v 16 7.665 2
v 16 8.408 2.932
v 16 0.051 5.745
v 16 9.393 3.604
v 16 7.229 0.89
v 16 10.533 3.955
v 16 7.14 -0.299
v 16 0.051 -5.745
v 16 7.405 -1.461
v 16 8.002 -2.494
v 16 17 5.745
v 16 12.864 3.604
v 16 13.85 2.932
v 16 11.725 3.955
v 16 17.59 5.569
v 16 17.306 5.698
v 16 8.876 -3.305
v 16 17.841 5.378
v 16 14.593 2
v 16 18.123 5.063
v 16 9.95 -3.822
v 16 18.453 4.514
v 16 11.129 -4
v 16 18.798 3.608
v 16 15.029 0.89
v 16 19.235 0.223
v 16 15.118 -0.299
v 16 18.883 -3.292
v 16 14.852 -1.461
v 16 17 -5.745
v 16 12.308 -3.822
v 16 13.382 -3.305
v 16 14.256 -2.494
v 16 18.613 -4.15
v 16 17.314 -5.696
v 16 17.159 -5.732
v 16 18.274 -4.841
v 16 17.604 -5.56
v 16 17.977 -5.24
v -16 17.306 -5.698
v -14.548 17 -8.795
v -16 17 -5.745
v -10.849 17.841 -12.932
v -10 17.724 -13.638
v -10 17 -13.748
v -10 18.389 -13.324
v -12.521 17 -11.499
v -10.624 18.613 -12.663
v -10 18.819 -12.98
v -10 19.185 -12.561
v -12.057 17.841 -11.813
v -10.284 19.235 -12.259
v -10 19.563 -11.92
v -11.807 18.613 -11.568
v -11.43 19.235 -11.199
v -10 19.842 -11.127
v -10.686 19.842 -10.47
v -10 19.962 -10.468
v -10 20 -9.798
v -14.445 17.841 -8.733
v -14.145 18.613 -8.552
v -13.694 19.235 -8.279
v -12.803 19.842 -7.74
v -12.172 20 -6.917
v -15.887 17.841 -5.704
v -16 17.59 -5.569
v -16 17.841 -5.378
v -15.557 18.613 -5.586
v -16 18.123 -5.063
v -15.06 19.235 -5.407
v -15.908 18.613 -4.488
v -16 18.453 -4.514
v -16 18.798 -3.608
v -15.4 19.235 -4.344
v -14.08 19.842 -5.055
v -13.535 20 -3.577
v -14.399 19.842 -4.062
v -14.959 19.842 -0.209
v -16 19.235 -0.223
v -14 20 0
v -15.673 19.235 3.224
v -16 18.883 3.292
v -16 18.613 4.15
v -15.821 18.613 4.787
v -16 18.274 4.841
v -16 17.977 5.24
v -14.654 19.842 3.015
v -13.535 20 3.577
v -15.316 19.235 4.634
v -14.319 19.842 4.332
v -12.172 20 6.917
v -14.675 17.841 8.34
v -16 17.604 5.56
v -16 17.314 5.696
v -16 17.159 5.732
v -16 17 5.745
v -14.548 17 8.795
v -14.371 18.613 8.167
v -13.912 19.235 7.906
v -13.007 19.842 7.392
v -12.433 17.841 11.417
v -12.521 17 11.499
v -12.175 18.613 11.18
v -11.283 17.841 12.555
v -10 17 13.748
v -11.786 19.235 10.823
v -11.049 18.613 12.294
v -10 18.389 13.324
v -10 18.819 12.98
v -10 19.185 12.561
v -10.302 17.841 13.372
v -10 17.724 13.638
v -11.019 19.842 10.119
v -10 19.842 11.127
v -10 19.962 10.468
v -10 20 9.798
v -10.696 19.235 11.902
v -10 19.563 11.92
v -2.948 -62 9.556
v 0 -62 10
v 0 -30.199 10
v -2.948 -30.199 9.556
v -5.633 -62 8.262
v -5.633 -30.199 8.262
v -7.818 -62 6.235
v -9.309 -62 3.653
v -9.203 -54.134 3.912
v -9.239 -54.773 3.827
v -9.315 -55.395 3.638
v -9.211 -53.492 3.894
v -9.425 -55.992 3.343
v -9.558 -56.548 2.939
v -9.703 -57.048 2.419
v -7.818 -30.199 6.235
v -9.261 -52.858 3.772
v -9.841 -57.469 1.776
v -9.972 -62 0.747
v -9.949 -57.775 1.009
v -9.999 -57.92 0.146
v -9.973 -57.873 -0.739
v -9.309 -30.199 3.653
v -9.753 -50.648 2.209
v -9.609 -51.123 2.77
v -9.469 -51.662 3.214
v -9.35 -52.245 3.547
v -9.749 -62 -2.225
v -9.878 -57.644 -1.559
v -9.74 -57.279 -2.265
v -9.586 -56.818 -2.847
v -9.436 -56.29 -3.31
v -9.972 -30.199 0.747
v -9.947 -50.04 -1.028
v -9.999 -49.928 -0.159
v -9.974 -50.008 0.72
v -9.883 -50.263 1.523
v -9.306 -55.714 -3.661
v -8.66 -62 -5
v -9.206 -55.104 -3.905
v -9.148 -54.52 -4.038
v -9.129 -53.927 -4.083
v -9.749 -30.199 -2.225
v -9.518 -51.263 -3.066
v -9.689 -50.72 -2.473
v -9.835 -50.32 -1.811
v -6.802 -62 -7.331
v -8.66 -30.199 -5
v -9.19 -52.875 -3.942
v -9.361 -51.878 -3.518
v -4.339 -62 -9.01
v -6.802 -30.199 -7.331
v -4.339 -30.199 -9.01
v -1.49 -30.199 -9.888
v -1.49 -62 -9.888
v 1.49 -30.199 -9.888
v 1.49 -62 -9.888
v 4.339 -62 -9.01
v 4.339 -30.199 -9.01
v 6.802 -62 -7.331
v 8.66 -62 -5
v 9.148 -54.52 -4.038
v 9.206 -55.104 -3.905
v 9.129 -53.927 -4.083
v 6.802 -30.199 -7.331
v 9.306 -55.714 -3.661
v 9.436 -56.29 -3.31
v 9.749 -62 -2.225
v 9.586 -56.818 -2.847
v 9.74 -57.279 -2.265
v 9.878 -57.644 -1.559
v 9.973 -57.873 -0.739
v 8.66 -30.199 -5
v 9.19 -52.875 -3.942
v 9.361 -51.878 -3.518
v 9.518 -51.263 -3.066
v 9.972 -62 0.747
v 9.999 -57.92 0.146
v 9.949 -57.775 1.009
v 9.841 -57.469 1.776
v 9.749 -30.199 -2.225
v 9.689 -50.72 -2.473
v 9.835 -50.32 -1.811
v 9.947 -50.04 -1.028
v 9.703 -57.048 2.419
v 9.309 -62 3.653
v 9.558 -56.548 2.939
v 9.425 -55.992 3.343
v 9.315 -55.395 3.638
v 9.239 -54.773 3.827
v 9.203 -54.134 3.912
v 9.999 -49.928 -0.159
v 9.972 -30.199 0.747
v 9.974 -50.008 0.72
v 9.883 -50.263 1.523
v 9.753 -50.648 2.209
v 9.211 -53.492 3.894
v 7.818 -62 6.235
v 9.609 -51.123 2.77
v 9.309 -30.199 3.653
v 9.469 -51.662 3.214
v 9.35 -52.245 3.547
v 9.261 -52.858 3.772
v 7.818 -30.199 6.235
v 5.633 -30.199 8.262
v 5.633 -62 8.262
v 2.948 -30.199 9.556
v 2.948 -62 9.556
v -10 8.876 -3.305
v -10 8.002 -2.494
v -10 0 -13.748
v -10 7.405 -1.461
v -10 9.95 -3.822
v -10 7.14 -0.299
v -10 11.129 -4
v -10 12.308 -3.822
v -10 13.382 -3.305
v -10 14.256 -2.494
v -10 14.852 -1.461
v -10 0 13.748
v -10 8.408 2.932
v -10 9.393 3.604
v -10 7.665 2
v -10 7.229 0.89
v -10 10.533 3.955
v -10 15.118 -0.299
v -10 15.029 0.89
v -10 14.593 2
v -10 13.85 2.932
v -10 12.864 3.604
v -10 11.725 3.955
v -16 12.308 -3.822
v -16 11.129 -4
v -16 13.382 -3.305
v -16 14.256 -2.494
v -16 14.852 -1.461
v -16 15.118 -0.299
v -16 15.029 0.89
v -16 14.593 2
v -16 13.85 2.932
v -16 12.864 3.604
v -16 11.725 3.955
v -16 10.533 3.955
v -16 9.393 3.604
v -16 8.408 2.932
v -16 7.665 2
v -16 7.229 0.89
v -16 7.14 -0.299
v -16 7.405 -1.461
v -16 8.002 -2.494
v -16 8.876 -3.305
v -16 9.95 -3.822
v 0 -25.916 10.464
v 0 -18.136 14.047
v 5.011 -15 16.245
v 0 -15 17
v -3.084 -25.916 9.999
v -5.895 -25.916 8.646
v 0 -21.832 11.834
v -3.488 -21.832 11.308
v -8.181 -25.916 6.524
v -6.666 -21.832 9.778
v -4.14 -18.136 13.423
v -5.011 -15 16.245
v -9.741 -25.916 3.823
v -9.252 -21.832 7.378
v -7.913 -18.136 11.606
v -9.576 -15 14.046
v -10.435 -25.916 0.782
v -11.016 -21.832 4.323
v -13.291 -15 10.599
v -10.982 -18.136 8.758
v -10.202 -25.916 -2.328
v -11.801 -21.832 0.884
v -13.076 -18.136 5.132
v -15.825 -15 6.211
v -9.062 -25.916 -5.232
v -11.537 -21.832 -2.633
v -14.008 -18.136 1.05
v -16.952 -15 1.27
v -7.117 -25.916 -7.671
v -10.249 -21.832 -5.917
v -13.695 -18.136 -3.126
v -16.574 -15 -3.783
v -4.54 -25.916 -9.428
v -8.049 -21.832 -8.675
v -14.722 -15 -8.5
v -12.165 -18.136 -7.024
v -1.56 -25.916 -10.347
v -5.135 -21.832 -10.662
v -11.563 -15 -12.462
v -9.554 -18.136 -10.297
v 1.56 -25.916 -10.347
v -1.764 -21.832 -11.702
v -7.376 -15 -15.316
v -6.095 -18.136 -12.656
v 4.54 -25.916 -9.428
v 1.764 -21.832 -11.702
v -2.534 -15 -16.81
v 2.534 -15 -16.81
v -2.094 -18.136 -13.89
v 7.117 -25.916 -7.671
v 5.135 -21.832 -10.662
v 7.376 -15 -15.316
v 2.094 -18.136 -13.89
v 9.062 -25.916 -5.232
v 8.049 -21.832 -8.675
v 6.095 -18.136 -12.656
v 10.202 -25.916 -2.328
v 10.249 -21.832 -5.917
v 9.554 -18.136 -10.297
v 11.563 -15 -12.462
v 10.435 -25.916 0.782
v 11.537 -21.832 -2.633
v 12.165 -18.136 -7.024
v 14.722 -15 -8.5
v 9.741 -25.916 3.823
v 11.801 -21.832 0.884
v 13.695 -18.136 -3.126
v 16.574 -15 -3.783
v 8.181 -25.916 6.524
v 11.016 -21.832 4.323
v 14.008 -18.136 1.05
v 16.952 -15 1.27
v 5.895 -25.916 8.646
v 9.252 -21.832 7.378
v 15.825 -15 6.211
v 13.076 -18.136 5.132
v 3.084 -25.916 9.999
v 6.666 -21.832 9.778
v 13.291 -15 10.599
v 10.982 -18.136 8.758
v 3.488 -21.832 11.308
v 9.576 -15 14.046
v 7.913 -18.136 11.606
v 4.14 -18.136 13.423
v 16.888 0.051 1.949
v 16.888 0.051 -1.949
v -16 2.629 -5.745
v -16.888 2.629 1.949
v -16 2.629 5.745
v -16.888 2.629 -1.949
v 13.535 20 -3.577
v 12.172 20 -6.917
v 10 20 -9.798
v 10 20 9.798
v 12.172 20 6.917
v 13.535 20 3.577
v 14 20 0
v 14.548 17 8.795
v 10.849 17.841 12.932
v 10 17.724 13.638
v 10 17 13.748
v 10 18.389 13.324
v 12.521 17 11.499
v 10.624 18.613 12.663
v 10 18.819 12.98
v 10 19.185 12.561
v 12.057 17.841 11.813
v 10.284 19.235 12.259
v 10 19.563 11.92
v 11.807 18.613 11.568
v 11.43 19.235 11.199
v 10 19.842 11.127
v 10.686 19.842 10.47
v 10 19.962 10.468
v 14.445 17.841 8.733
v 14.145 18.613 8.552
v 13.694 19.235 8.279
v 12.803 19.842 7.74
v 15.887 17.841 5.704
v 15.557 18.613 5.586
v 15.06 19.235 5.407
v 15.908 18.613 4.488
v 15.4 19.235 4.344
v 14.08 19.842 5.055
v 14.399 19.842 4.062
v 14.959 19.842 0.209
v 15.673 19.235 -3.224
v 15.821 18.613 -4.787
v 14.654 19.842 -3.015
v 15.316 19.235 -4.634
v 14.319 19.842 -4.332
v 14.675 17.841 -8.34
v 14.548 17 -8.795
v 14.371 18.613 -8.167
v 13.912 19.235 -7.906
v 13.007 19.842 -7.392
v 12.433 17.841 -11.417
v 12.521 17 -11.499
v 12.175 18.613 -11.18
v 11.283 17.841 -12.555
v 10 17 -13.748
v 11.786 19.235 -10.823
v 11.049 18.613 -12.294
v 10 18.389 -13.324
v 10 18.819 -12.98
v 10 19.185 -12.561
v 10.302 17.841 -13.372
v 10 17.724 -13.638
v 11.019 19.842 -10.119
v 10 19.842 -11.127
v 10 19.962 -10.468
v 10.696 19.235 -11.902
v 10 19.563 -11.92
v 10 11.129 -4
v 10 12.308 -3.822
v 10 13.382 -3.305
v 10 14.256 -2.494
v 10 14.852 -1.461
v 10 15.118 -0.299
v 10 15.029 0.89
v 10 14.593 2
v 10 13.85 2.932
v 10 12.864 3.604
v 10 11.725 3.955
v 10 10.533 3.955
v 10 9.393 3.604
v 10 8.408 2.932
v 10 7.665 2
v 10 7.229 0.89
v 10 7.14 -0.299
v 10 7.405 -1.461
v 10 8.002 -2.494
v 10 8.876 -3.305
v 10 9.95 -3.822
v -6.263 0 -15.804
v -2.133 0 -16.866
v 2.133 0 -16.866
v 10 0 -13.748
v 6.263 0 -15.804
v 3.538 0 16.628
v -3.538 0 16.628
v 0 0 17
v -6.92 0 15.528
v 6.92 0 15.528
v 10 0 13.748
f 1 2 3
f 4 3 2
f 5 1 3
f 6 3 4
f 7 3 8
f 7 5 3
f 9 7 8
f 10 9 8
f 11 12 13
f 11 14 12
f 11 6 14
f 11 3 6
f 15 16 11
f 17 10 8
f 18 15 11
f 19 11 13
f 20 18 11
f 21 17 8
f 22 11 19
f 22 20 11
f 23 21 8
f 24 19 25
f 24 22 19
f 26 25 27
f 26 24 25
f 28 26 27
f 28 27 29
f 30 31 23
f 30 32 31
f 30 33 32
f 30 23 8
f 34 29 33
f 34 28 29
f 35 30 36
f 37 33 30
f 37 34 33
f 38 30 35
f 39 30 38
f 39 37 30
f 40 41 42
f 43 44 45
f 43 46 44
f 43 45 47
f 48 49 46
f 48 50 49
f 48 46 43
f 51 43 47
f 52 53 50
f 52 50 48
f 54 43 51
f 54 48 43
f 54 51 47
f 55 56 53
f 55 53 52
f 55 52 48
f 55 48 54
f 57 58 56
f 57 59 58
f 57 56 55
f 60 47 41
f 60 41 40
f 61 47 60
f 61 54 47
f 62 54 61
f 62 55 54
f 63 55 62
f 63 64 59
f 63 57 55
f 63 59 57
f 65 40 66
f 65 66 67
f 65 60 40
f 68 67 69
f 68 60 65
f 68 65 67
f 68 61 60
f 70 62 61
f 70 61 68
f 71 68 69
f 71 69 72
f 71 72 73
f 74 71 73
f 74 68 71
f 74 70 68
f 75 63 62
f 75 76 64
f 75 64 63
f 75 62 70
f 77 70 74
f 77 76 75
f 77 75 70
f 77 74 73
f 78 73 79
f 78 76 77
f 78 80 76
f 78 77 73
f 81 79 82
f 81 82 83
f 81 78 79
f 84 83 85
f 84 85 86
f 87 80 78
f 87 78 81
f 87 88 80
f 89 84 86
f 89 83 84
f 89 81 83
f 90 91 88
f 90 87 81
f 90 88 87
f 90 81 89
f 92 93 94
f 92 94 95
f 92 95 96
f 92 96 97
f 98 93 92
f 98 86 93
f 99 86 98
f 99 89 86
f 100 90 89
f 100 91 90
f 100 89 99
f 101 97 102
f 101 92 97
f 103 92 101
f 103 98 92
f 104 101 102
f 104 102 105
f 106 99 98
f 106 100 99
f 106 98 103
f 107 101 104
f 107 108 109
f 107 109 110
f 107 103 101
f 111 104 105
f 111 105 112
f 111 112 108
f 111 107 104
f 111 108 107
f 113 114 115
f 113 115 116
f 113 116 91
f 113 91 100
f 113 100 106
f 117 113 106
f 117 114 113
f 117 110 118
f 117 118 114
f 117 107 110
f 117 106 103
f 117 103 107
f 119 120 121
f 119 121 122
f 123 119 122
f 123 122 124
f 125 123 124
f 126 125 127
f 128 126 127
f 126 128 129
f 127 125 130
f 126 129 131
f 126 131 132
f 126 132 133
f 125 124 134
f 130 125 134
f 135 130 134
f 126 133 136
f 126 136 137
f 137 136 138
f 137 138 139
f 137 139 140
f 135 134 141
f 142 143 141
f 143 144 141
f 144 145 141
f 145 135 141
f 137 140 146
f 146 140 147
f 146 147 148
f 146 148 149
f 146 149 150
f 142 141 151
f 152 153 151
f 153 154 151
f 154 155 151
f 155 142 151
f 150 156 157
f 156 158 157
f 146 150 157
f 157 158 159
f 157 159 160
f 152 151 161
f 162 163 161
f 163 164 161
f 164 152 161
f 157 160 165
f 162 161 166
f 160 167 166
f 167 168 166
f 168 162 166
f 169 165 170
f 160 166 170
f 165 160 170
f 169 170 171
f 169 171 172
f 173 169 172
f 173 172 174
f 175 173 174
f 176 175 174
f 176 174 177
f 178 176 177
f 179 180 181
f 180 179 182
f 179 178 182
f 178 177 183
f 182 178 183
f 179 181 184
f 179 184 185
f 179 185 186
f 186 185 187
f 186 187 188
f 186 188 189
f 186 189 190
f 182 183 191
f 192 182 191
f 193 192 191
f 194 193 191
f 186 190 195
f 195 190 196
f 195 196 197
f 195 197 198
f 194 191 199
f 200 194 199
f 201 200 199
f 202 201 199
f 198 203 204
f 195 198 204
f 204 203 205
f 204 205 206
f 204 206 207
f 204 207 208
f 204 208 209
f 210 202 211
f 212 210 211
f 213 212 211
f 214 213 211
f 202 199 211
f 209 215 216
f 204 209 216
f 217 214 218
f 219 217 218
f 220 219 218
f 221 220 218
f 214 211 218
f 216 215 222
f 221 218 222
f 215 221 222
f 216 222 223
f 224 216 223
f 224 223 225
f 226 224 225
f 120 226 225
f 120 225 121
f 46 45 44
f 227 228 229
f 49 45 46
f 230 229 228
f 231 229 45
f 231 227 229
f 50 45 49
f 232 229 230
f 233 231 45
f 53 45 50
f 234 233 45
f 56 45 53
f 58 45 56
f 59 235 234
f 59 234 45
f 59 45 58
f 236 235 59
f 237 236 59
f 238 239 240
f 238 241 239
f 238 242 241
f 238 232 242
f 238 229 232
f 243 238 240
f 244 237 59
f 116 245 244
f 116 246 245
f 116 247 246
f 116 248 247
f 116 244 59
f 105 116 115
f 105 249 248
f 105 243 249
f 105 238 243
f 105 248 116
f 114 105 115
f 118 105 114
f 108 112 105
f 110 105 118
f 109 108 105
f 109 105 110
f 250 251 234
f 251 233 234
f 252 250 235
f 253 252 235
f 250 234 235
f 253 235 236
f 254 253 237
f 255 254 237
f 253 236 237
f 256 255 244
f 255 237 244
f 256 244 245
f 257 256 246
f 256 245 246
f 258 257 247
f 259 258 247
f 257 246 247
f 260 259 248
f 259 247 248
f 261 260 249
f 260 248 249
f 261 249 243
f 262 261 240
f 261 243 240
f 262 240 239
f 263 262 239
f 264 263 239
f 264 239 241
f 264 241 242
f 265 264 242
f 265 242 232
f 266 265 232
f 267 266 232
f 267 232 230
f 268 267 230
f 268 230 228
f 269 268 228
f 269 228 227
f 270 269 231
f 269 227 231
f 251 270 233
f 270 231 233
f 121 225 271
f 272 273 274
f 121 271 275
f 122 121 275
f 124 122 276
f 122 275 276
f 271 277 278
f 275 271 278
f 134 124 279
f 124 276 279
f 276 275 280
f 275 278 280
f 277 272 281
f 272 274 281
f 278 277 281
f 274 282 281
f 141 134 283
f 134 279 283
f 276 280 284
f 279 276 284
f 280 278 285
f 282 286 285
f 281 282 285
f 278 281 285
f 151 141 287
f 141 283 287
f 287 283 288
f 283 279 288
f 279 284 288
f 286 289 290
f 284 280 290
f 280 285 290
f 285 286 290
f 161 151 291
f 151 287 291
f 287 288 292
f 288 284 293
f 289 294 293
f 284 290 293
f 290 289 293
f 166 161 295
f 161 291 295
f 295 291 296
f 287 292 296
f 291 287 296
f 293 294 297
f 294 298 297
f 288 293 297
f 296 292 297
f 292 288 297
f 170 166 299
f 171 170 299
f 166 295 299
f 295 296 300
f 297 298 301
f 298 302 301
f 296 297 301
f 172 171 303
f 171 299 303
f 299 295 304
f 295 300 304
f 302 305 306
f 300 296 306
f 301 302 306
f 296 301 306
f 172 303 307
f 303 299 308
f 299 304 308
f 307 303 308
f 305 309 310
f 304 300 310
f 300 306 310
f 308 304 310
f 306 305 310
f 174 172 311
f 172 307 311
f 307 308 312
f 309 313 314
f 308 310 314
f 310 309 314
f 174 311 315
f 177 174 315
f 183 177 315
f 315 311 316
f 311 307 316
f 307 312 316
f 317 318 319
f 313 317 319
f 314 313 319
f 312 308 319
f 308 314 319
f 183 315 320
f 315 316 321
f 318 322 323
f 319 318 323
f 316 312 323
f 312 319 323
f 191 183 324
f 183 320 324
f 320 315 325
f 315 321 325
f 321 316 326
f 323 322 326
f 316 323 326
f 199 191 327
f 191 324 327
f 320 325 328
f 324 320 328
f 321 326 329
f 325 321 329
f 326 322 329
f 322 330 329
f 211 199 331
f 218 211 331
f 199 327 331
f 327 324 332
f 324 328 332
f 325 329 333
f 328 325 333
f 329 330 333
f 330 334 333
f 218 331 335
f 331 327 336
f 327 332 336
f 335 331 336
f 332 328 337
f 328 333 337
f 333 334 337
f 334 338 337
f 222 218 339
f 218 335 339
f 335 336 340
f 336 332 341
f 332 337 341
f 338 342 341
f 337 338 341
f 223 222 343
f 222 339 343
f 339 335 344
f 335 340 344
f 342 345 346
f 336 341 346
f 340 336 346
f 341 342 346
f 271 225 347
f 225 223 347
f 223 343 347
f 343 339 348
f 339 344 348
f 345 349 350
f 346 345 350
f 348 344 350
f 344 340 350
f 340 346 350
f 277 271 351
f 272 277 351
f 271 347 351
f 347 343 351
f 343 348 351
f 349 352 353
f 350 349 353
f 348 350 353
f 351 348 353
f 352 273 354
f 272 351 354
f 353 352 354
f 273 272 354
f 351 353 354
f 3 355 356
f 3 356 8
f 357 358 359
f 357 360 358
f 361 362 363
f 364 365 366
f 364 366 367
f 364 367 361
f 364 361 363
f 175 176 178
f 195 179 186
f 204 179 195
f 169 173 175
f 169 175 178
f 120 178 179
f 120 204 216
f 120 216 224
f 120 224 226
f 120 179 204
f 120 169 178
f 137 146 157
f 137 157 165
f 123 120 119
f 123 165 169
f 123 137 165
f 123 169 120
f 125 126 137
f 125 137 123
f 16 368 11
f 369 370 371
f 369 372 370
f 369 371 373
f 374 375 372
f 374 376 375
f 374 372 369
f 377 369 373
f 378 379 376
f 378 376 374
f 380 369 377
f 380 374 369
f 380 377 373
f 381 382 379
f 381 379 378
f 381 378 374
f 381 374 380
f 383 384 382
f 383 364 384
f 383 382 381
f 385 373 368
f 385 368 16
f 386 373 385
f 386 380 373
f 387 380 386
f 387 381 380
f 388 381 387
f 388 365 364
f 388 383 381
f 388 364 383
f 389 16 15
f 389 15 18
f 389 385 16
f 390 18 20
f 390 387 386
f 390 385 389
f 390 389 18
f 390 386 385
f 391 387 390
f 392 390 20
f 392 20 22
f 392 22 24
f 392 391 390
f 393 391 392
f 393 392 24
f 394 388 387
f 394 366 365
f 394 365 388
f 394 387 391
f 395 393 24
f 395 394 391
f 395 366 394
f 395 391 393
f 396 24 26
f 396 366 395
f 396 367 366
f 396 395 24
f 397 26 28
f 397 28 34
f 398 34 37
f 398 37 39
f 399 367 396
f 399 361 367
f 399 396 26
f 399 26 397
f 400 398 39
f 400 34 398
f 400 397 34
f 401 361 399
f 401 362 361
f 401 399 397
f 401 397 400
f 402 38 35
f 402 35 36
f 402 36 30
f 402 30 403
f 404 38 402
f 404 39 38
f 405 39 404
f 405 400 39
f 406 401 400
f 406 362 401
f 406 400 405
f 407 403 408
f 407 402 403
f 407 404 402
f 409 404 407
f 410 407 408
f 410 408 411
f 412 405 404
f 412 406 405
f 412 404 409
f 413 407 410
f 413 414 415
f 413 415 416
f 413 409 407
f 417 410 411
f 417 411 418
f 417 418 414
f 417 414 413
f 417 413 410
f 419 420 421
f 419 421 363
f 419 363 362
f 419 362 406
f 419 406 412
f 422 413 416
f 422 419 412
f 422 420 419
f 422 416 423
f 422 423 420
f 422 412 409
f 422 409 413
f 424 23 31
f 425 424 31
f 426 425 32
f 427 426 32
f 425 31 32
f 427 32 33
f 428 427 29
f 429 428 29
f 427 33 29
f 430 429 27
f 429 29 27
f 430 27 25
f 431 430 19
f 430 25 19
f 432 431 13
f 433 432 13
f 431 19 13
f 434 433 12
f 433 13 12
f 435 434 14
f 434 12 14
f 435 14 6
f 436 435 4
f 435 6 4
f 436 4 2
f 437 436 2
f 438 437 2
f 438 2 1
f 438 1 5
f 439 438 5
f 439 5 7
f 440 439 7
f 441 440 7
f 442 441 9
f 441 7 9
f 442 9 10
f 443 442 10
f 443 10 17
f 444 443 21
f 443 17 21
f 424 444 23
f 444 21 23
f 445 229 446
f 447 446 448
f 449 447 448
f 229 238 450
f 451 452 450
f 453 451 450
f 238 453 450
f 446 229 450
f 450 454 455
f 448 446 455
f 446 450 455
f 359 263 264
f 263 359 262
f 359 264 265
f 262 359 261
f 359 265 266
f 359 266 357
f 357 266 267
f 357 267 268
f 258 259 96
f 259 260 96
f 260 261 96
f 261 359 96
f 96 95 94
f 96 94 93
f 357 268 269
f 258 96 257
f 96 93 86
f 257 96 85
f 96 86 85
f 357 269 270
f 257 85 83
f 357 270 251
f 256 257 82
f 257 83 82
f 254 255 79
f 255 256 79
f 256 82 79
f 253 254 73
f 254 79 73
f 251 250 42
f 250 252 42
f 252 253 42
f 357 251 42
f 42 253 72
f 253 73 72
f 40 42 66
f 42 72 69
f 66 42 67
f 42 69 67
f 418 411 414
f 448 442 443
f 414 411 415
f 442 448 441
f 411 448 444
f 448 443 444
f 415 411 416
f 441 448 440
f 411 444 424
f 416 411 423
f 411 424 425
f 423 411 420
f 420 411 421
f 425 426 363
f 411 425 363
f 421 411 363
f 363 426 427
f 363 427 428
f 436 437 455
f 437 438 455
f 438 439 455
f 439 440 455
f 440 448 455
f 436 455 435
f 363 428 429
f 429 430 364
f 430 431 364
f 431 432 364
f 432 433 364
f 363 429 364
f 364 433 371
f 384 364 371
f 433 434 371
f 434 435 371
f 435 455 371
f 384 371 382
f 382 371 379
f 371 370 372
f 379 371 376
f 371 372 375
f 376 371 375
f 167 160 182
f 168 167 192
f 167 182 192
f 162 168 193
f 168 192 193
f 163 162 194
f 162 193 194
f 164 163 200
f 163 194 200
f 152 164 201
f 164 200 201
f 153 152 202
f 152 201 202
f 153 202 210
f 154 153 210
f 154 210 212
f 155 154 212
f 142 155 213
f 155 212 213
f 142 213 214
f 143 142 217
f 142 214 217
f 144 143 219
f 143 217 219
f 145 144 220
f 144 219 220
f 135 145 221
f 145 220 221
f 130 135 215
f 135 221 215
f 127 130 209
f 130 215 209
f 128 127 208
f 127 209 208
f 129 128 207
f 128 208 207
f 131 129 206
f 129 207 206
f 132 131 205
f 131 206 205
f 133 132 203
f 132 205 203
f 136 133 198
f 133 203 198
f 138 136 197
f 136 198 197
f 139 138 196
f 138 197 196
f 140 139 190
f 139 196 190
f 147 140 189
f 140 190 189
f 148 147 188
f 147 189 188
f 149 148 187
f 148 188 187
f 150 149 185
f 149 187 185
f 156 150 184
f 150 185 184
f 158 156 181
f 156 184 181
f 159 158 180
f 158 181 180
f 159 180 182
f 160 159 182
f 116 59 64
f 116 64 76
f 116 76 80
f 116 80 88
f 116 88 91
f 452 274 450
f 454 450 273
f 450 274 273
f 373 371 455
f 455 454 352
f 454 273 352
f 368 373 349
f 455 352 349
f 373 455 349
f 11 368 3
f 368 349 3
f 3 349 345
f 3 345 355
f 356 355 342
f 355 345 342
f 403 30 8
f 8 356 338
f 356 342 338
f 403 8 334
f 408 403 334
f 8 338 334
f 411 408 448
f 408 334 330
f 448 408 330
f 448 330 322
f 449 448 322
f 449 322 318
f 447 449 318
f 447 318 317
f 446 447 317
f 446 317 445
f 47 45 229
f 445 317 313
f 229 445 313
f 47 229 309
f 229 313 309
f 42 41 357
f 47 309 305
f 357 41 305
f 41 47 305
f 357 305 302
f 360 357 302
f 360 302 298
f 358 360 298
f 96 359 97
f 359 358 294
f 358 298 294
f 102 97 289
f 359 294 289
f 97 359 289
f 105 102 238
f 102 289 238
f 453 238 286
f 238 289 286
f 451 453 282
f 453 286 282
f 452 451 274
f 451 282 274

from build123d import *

# Parameters (mm, degrees)
EXTRUDE_START       = -15
SKETCH_1_R          = 17
EXTRUDE_1_DEPTH     = 35
SKETCH_2_R          = 10
EXTRUDE_2_DEPTH     = 47
FILLET_3_R          = 3
FILLET_4_R          = 20
SKETCH_4_W          = 20
SKETCH_4_H          = 21.133558335
CUT_EXTRUDE_2_DEPTH = 35
SKETCH_5_R          = 4
CUT_EXTRUDE_3_DEPTH = 35
CUT_EXTRUDE_START   = 20
SKETCH_6_W          = 15
SKETCH_6_H          = 20.573480962
CUT_EXTRUDE_4_DEPTH = 4
CUT_EXTRUDE_START_2 = -20
SKETCH_7_W          = 20
SKETCH_7_H          = 18.159164137
CUT_EXTRUDE_5_DEPTH = 4
SKETCH_8_R          = 4
CUT_EXTRUDE_6_DEPTH = 35


with BuildPart() as part:
    # Эскиз1 → Вытянуть1 (new body)
    with BuildSketch(Plane(origin=(0, 0, 0), x_dir=(1, 0, 0), z_dir=(0, 1, 0)).offset(EXTRUDE_START)):
        with Locations(Location((0, 0, 0), (0, 0, 270))):
            Circle(SKETCH_1_R)
    extrude(amount=EXTRUDE_1_DEPTH)

    # Эскиз2 → Вытянуть2 (add)
    with BuildSketch(Plane.XZ.offset(15)):
        with Locations(Location((0, 0, 0), (0, 0, 90))):
            Circle(SKETCH_2_R)
    extrude(amount=EXTRUDE_2_DEPTH)

    # Скругление3
    fillet_3_edges = [part.edges().sort_by_distance(p)[0] for p in [
        (0, 20, -17),
    ]]
    fillet(fillet_3_edges, radius=FILLET_3_R)

    # Скругление4
    # the kernel refuses this fillet: 20 mm, written as the material it adds along each edge
    with BuildSketch(Plane(origin=(0, -15, 0), x_dir=(0, 0, 1), z_dir=(1, 0, 0))) as fillet_4_piece_1:
        with BuildLine():
            CenterArc((30, 15.198684154), FILLET_4_R, 180, 49.458398126)
            Line((10, 15.198684154), (9.6, 15.198684154))
            Line((9.6, 15.198684154), (9.6, 0))
            Line((9.6, 0), (10, -0.4))
            ThreePointArc((10, -0.4), (13.5, -0.4), (16.74, -0.303973683))
            Line((16.74, -0.303973683), (17, 0))
        make_face()
    revolve(axis=Axis((0, -15, 0), (0, -1, 0)))

    # Эскиз4 → Вырез-Вытянуть2 (cut, symmetric)
    with BuildSketch(Plane.XY):
        with Locations((0, 10.566779168)):
            Rectangle(SKETCH_4_W, SKETCH_4_H)
    extrude(amount=CUT_EXTRUDE_2_DEPTH, both=True, mode=Mode.SUBTRACT)

    # Эскиз5 → Вырез-Вытянуть3 (cut, symmetric)
    with BuildSketch(Plane(origin=(0, 0, 0), x_dir=(0, 0, -1), z_dir=(1, 0, 0))):
        with Locations((0, 11.128860454)):
            Circle(SKETCH_5_R)
    extrude(amount=CUT_EXTRUDE_3_DEPTH, both=True, mode=Mode.SUBTRACT)

    # Эскиз6 → Вырез-Вытянуть4 (cut)
    with BuildSketch(Plane(origin=(0, 0, 0), x_dir=(0, 0, -1), z_dir=(1, 0, 0)).offset(CUT_EXTRUDE_START)):
        with Locations((0, 10.338040732)):
            Rectangle(SKETCH_6_W, SKETCH_6_H)
    extrude(amount=-CUT_EXTRUDE_4_DEPTH, mode=Mode.SUBTRACT)

    # Эскиз7 → Вырез-Вытянуть5 (cut)
    with BuildSketch(Plane(origin=(0, 0, 0), x_dir=(0, 0, -1), z_dir=(1, 0, 0)).offset(CUT_EXTRUDE_START_2)):
        with Locations((0, 11.708442525)):
            Rectangle(SKETCH_7_W, SKETCH_7_H)
    extrude(amount=CUT_EXTRUDE_5_DEPTH, mode=Mode.SUBTRACT)

    # Эскиз8 → Вырез-Вытянуть6 (cut, symmetric)
    with BuildSketch(Plane(origin=(0, 0, 0), x_dir=(0, 0, -1), z_dir=(1, 0, 0))):
        with Locations((0.082515947, -53.926937182)):
            Circle(SKETCH_8_R)
    extrude(amount=CUT_EXTRUDE_6_DEPTH, both=True, mode=Mode.SUBTRACT)


solid = part.part
